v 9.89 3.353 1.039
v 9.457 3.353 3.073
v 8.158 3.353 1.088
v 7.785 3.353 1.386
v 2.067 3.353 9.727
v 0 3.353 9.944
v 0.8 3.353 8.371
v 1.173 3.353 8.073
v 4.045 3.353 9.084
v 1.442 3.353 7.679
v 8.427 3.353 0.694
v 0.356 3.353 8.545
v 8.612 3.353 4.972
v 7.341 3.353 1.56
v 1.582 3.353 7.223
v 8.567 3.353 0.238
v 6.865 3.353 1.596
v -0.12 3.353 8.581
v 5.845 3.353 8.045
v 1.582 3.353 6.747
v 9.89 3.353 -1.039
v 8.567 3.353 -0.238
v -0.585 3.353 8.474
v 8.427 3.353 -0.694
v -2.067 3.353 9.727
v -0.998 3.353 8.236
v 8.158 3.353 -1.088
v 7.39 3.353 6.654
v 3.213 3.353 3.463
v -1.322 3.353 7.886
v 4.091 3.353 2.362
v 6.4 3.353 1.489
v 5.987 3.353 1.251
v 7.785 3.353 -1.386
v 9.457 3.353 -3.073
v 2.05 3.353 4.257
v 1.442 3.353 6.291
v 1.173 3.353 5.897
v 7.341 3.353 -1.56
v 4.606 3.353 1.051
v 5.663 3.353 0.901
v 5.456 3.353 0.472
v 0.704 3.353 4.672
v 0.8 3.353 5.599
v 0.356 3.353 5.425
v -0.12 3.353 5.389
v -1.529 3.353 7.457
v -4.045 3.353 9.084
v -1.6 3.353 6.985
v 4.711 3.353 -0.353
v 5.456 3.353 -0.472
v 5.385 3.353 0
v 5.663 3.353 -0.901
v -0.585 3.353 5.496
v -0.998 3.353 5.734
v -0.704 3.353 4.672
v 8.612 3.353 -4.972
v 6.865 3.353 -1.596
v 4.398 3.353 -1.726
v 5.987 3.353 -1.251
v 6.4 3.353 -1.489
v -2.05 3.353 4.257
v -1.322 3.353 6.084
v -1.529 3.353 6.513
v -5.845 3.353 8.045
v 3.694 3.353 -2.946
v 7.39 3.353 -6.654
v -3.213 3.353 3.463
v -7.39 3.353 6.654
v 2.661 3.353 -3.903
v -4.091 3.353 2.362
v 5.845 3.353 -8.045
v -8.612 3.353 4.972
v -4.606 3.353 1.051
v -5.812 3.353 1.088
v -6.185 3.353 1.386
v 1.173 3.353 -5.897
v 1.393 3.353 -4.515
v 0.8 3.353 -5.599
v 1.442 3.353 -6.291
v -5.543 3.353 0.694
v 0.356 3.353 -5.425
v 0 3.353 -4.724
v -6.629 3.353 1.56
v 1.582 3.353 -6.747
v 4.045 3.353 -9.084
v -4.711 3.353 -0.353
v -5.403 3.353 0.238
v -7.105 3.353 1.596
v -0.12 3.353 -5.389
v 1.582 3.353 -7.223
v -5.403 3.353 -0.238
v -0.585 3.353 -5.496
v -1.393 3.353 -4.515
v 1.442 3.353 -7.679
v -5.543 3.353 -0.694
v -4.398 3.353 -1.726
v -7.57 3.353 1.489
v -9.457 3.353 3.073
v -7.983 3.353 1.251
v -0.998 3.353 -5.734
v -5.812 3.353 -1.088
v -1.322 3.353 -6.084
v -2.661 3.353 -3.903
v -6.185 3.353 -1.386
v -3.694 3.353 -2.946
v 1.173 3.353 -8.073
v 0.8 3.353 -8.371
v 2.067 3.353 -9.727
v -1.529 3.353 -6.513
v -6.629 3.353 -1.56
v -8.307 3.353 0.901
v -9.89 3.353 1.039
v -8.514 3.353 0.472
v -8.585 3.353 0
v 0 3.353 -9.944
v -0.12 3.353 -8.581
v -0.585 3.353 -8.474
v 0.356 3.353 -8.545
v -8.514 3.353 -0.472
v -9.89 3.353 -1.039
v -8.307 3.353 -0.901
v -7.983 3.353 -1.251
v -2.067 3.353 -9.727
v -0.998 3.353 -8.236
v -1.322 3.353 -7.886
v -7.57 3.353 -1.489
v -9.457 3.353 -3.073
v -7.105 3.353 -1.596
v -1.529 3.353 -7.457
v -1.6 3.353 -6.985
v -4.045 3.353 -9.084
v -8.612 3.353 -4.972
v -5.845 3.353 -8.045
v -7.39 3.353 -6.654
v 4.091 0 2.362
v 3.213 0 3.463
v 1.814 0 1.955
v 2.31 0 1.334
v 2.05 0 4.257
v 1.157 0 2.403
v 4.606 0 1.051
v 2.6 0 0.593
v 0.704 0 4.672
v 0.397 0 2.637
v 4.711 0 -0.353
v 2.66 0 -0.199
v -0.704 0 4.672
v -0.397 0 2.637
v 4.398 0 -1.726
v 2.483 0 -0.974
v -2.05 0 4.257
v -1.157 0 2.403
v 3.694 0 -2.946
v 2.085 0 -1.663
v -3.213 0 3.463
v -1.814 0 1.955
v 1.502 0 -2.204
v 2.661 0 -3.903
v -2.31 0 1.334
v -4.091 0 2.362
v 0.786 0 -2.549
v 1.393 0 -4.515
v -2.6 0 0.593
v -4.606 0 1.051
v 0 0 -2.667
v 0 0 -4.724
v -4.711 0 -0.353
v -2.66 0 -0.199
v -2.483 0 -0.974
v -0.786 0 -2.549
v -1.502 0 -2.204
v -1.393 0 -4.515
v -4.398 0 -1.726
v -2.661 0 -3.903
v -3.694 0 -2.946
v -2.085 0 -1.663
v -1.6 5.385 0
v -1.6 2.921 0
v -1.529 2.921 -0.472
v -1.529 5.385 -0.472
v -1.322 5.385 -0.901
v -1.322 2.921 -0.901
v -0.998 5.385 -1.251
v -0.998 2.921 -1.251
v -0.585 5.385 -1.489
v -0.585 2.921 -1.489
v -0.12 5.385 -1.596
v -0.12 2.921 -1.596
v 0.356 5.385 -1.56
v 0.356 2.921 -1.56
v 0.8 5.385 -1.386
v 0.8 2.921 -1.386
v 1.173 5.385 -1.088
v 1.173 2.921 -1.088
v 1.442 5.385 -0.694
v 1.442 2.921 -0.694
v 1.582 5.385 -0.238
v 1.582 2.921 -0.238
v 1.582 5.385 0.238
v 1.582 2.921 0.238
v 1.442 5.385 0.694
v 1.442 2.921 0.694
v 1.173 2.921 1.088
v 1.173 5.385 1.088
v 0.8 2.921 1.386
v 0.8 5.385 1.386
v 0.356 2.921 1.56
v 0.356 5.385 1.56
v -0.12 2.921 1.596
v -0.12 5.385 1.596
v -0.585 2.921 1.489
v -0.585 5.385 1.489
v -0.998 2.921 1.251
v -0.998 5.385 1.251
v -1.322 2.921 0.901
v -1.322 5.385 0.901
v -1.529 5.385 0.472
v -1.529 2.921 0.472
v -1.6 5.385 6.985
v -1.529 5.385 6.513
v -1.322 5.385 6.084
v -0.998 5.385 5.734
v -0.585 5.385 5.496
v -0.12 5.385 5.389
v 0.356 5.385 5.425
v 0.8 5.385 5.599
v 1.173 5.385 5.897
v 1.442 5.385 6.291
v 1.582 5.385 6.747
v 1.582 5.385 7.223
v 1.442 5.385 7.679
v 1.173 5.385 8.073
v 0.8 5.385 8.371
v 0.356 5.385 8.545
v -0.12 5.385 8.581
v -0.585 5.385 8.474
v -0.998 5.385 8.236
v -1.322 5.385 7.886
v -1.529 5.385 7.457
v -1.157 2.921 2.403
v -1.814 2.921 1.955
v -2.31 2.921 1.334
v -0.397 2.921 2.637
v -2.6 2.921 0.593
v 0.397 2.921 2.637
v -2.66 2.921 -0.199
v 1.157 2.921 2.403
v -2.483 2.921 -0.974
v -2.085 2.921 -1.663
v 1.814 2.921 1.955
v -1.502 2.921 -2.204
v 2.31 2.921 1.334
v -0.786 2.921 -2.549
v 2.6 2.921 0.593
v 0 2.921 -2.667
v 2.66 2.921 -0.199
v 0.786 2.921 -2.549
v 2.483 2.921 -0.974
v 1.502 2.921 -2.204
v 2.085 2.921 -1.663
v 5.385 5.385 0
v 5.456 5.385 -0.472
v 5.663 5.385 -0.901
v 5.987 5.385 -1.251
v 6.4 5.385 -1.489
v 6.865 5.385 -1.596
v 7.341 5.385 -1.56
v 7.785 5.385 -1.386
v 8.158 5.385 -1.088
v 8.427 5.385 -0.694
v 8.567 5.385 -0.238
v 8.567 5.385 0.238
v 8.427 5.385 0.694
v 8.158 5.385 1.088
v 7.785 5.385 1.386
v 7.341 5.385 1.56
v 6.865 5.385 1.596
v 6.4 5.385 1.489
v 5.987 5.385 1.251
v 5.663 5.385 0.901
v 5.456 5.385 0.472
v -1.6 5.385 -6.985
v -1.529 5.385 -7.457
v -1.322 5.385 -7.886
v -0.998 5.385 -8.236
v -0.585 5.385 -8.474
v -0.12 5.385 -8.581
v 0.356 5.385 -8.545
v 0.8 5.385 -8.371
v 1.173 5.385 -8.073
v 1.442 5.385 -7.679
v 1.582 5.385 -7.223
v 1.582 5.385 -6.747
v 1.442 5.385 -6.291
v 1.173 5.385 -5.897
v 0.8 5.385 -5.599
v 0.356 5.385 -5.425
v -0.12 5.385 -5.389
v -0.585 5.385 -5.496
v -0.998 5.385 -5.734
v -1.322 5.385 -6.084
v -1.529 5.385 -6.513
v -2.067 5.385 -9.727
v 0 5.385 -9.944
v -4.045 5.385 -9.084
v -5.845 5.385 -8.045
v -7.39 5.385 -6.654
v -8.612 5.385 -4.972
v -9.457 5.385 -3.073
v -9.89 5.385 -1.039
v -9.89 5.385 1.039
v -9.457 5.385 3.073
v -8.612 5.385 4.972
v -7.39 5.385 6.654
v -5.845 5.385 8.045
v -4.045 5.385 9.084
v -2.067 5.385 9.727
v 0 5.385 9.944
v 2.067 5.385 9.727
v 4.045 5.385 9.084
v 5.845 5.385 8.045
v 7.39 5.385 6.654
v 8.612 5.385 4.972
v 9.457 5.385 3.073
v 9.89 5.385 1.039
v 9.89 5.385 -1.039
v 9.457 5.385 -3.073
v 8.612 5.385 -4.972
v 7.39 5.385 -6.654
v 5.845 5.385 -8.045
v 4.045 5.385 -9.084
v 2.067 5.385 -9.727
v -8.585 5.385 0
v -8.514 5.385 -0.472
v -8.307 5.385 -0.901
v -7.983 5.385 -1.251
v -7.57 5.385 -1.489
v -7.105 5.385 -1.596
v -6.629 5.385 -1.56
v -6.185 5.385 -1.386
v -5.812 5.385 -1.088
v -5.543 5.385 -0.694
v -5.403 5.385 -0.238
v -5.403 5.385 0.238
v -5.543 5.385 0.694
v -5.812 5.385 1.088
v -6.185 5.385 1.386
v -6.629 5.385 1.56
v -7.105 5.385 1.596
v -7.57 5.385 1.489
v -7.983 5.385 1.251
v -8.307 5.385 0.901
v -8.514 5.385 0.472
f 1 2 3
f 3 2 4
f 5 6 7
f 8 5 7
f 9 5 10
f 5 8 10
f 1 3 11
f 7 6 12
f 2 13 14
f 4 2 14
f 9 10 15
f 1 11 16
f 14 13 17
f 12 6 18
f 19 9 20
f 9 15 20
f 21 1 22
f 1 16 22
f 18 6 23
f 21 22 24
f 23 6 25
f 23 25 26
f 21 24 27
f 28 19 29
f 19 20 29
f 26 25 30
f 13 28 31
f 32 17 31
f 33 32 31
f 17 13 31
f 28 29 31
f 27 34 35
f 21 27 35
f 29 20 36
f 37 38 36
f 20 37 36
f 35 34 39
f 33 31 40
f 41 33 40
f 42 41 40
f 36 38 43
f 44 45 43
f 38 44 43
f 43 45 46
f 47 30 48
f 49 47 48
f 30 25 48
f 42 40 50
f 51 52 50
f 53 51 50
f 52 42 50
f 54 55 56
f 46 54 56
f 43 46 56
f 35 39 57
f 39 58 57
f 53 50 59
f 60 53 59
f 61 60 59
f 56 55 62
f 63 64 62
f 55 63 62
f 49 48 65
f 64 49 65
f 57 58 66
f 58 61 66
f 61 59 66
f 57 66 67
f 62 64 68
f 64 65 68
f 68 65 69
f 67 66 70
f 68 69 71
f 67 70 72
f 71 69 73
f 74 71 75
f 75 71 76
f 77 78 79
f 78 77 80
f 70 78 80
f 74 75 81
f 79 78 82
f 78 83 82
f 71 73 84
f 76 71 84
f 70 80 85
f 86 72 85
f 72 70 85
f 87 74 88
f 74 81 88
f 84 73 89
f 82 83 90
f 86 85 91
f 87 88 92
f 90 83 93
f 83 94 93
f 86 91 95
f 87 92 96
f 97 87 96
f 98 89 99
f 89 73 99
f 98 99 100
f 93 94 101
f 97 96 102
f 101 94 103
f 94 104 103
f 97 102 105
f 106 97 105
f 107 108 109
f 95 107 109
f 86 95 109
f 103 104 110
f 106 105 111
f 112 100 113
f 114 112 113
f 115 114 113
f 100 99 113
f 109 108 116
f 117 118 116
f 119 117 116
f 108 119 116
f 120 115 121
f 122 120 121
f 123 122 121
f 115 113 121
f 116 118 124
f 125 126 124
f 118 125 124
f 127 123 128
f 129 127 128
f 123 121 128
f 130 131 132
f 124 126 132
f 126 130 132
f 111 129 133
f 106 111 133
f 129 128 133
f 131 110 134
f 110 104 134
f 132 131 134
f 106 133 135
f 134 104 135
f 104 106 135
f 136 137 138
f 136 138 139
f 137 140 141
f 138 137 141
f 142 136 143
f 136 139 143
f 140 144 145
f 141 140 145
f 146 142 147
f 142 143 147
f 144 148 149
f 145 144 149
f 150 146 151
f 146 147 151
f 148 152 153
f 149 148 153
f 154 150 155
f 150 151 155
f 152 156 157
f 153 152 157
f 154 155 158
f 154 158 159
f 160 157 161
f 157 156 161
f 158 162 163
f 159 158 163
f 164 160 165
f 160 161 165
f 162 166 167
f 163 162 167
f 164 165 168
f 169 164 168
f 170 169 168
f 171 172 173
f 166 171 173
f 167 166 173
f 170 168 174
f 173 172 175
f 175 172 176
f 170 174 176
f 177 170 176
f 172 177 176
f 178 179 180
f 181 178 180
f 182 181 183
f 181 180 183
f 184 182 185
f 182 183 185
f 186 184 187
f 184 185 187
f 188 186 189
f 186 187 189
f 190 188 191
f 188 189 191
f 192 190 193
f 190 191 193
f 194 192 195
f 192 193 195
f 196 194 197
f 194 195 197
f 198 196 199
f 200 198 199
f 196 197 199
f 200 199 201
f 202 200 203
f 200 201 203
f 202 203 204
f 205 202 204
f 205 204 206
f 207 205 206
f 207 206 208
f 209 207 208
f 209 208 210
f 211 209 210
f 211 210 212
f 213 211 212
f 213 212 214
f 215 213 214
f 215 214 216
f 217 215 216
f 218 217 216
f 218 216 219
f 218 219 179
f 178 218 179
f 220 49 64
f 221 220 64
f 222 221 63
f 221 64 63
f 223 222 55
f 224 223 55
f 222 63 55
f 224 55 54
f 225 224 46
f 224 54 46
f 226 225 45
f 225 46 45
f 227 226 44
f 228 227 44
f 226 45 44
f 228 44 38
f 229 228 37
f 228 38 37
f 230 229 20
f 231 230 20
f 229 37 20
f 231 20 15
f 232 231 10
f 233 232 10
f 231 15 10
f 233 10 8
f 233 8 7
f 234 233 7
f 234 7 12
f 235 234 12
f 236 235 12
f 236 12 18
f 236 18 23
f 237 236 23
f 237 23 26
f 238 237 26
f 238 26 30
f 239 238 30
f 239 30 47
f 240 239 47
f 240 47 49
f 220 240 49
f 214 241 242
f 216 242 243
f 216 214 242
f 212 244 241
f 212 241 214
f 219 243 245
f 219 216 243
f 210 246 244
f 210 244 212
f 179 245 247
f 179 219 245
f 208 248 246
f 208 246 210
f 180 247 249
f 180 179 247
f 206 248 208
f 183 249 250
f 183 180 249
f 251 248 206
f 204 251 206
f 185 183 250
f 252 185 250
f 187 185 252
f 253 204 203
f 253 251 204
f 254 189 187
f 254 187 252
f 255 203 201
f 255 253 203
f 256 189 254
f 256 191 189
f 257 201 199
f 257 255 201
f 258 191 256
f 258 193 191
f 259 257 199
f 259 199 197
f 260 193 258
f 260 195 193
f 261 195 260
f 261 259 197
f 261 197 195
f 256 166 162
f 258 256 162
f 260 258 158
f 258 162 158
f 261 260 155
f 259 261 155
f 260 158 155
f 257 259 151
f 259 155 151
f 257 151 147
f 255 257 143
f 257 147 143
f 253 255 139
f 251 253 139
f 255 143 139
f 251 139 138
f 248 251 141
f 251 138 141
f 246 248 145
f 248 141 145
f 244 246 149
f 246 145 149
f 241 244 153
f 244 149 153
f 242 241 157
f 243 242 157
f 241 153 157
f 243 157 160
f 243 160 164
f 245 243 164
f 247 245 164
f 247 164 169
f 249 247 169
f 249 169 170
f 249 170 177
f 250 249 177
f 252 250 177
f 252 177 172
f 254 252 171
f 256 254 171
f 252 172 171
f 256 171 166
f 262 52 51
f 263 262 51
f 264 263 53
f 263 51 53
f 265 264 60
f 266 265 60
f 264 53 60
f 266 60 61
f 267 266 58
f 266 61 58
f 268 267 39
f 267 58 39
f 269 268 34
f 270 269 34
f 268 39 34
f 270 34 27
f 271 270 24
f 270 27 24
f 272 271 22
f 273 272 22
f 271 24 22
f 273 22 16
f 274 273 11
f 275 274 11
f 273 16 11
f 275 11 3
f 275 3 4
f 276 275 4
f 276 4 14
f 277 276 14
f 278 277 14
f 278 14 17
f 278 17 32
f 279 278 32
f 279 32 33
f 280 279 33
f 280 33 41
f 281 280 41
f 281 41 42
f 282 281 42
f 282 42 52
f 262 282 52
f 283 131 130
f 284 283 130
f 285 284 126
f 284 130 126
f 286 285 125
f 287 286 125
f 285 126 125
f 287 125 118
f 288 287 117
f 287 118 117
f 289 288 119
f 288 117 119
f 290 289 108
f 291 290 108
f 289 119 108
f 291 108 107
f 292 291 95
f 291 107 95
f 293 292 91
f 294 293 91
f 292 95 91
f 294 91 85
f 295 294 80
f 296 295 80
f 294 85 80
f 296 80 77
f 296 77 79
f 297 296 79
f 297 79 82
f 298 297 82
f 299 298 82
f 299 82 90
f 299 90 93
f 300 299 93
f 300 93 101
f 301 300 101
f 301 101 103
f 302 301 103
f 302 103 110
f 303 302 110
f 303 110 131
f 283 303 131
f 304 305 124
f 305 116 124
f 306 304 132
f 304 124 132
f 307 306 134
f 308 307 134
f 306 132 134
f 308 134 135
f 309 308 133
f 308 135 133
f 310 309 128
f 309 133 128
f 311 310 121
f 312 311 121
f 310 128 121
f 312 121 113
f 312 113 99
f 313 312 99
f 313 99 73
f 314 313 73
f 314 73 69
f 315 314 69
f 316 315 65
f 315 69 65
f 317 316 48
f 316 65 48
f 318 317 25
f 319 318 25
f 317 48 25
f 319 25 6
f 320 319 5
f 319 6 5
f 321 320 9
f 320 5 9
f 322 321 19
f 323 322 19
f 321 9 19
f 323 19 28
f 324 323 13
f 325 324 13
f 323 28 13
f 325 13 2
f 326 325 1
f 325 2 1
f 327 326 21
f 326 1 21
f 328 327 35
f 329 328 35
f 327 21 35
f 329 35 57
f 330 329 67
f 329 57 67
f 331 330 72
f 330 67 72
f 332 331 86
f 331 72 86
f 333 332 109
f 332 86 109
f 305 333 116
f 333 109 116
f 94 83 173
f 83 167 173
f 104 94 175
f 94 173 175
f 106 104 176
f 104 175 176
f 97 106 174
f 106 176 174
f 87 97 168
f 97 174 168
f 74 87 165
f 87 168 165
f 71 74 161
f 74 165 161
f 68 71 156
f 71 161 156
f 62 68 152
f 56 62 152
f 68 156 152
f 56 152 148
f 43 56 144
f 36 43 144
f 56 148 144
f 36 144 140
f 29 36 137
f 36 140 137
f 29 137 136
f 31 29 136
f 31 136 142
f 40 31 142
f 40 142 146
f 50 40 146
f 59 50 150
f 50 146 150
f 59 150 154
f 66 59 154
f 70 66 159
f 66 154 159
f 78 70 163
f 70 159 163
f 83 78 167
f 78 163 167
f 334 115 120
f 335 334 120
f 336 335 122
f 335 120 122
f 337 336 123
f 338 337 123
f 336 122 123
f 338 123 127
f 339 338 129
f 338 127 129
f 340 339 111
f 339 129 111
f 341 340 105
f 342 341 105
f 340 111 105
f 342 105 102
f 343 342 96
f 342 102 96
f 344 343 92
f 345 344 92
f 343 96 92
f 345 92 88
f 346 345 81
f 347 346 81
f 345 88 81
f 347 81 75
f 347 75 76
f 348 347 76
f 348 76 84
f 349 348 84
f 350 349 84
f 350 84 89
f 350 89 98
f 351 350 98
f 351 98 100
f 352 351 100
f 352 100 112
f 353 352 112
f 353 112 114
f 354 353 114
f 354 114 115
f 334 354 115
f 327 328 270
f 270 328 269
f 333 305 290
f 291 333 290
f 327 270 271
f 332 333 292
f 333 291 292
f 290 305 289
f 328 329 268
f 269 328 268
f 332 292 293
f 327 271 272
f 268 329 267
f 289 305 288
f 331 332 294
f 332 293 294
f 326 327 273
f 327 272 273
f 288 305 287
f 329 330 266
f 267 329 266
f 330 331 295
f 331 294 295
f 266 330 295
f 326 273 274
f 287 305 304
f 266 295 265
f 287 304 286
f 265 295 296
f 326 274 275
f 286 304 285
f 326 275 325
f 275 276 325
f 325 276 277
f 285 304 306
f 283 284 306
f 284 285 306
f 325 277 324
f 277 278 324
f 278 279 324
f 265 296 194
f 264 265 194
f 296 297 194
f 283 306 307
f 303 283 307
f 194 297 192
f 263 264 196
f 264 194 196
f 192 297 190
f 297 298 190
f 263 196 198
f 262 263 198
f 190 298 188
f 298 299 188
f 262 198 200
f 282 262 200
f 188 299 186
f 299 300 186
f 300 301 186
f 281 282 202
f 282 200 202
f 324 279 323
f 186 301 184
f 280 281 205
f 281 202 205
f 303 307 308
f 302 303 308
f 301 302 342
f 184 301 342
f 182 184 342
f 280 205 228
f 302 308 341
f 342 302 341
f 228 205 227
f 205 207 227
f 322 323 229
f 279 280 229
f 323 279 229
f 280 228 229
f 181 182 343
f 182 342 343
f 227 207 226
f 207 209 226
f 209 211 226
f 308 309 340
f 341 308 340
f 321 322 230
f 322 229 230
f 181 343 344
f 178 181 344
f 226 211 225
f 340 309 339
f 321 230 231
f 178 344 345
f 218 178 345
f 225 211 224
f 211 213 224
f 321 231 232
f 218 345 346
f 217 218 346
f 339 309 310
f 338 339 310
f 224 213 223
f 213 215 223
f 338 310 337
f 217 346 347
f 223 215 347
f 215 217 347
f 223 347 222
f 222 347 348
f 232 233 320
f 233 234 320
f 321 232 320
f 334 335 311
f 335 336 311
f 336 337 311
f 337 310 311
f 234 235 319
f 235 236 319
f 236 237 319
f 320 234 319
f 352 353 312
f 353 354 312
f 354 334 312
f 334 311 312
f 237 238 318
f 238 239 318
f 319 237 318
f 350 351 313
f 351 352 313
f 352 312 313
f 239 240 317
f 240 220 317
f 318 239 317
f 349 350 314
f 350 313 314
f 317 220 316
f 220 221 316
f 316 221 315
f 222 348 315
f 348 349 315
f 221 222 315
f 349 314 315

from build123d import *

# Parameters (mm, degrees)
SKETCH4_R            = 2.667
CUT_EXTRUDE2_DEPTH   = 2.921
M3_CLEARANCE_HOLE1_D = 3.2


with BuildPart() as part:
    # Sketch1 → Revolve1 (revolve)
    with BuildSketch(Plane(origin=(0, 0, 0), x_dir=(0, 0, -1), z_dir=(1, 0, 0))):
        Polygon((0, 5.3848), (9.9441, 5.3848), (9.9441, 3.3528), (4.7244, 3.3528), (4.7244, 0), (0, 0), align=None)
    revolve(axis=Axis((0, 0, 0), (0, 1, 0)))

    # Sketch4 → Cut-Extrude2 (cut)
    with BuildSketch(Plane.XZ):
        with Locations(Location((0, 0, 0), (0, 0, 270))):
            Circle(SKETCH4_R)
    extrude(amount=-CUT_EXTRUDE2_DEPTH, mode=Mode.SUBTRACT)

    # M3 Clearance Hole1 (through all)
    with Locations(Plane(origin=(0, 5.3848, 0), x_dir=(1, 0, 0), z_dir=(0, 1, 0))):
        with Locations((-6.985, 0), (0, 0), (6.985, 0), (0, 6.985), (0, -6.985)):
            Hole(M3_CLEARANCE_HOLE1_D / 2)


solid = part.part
